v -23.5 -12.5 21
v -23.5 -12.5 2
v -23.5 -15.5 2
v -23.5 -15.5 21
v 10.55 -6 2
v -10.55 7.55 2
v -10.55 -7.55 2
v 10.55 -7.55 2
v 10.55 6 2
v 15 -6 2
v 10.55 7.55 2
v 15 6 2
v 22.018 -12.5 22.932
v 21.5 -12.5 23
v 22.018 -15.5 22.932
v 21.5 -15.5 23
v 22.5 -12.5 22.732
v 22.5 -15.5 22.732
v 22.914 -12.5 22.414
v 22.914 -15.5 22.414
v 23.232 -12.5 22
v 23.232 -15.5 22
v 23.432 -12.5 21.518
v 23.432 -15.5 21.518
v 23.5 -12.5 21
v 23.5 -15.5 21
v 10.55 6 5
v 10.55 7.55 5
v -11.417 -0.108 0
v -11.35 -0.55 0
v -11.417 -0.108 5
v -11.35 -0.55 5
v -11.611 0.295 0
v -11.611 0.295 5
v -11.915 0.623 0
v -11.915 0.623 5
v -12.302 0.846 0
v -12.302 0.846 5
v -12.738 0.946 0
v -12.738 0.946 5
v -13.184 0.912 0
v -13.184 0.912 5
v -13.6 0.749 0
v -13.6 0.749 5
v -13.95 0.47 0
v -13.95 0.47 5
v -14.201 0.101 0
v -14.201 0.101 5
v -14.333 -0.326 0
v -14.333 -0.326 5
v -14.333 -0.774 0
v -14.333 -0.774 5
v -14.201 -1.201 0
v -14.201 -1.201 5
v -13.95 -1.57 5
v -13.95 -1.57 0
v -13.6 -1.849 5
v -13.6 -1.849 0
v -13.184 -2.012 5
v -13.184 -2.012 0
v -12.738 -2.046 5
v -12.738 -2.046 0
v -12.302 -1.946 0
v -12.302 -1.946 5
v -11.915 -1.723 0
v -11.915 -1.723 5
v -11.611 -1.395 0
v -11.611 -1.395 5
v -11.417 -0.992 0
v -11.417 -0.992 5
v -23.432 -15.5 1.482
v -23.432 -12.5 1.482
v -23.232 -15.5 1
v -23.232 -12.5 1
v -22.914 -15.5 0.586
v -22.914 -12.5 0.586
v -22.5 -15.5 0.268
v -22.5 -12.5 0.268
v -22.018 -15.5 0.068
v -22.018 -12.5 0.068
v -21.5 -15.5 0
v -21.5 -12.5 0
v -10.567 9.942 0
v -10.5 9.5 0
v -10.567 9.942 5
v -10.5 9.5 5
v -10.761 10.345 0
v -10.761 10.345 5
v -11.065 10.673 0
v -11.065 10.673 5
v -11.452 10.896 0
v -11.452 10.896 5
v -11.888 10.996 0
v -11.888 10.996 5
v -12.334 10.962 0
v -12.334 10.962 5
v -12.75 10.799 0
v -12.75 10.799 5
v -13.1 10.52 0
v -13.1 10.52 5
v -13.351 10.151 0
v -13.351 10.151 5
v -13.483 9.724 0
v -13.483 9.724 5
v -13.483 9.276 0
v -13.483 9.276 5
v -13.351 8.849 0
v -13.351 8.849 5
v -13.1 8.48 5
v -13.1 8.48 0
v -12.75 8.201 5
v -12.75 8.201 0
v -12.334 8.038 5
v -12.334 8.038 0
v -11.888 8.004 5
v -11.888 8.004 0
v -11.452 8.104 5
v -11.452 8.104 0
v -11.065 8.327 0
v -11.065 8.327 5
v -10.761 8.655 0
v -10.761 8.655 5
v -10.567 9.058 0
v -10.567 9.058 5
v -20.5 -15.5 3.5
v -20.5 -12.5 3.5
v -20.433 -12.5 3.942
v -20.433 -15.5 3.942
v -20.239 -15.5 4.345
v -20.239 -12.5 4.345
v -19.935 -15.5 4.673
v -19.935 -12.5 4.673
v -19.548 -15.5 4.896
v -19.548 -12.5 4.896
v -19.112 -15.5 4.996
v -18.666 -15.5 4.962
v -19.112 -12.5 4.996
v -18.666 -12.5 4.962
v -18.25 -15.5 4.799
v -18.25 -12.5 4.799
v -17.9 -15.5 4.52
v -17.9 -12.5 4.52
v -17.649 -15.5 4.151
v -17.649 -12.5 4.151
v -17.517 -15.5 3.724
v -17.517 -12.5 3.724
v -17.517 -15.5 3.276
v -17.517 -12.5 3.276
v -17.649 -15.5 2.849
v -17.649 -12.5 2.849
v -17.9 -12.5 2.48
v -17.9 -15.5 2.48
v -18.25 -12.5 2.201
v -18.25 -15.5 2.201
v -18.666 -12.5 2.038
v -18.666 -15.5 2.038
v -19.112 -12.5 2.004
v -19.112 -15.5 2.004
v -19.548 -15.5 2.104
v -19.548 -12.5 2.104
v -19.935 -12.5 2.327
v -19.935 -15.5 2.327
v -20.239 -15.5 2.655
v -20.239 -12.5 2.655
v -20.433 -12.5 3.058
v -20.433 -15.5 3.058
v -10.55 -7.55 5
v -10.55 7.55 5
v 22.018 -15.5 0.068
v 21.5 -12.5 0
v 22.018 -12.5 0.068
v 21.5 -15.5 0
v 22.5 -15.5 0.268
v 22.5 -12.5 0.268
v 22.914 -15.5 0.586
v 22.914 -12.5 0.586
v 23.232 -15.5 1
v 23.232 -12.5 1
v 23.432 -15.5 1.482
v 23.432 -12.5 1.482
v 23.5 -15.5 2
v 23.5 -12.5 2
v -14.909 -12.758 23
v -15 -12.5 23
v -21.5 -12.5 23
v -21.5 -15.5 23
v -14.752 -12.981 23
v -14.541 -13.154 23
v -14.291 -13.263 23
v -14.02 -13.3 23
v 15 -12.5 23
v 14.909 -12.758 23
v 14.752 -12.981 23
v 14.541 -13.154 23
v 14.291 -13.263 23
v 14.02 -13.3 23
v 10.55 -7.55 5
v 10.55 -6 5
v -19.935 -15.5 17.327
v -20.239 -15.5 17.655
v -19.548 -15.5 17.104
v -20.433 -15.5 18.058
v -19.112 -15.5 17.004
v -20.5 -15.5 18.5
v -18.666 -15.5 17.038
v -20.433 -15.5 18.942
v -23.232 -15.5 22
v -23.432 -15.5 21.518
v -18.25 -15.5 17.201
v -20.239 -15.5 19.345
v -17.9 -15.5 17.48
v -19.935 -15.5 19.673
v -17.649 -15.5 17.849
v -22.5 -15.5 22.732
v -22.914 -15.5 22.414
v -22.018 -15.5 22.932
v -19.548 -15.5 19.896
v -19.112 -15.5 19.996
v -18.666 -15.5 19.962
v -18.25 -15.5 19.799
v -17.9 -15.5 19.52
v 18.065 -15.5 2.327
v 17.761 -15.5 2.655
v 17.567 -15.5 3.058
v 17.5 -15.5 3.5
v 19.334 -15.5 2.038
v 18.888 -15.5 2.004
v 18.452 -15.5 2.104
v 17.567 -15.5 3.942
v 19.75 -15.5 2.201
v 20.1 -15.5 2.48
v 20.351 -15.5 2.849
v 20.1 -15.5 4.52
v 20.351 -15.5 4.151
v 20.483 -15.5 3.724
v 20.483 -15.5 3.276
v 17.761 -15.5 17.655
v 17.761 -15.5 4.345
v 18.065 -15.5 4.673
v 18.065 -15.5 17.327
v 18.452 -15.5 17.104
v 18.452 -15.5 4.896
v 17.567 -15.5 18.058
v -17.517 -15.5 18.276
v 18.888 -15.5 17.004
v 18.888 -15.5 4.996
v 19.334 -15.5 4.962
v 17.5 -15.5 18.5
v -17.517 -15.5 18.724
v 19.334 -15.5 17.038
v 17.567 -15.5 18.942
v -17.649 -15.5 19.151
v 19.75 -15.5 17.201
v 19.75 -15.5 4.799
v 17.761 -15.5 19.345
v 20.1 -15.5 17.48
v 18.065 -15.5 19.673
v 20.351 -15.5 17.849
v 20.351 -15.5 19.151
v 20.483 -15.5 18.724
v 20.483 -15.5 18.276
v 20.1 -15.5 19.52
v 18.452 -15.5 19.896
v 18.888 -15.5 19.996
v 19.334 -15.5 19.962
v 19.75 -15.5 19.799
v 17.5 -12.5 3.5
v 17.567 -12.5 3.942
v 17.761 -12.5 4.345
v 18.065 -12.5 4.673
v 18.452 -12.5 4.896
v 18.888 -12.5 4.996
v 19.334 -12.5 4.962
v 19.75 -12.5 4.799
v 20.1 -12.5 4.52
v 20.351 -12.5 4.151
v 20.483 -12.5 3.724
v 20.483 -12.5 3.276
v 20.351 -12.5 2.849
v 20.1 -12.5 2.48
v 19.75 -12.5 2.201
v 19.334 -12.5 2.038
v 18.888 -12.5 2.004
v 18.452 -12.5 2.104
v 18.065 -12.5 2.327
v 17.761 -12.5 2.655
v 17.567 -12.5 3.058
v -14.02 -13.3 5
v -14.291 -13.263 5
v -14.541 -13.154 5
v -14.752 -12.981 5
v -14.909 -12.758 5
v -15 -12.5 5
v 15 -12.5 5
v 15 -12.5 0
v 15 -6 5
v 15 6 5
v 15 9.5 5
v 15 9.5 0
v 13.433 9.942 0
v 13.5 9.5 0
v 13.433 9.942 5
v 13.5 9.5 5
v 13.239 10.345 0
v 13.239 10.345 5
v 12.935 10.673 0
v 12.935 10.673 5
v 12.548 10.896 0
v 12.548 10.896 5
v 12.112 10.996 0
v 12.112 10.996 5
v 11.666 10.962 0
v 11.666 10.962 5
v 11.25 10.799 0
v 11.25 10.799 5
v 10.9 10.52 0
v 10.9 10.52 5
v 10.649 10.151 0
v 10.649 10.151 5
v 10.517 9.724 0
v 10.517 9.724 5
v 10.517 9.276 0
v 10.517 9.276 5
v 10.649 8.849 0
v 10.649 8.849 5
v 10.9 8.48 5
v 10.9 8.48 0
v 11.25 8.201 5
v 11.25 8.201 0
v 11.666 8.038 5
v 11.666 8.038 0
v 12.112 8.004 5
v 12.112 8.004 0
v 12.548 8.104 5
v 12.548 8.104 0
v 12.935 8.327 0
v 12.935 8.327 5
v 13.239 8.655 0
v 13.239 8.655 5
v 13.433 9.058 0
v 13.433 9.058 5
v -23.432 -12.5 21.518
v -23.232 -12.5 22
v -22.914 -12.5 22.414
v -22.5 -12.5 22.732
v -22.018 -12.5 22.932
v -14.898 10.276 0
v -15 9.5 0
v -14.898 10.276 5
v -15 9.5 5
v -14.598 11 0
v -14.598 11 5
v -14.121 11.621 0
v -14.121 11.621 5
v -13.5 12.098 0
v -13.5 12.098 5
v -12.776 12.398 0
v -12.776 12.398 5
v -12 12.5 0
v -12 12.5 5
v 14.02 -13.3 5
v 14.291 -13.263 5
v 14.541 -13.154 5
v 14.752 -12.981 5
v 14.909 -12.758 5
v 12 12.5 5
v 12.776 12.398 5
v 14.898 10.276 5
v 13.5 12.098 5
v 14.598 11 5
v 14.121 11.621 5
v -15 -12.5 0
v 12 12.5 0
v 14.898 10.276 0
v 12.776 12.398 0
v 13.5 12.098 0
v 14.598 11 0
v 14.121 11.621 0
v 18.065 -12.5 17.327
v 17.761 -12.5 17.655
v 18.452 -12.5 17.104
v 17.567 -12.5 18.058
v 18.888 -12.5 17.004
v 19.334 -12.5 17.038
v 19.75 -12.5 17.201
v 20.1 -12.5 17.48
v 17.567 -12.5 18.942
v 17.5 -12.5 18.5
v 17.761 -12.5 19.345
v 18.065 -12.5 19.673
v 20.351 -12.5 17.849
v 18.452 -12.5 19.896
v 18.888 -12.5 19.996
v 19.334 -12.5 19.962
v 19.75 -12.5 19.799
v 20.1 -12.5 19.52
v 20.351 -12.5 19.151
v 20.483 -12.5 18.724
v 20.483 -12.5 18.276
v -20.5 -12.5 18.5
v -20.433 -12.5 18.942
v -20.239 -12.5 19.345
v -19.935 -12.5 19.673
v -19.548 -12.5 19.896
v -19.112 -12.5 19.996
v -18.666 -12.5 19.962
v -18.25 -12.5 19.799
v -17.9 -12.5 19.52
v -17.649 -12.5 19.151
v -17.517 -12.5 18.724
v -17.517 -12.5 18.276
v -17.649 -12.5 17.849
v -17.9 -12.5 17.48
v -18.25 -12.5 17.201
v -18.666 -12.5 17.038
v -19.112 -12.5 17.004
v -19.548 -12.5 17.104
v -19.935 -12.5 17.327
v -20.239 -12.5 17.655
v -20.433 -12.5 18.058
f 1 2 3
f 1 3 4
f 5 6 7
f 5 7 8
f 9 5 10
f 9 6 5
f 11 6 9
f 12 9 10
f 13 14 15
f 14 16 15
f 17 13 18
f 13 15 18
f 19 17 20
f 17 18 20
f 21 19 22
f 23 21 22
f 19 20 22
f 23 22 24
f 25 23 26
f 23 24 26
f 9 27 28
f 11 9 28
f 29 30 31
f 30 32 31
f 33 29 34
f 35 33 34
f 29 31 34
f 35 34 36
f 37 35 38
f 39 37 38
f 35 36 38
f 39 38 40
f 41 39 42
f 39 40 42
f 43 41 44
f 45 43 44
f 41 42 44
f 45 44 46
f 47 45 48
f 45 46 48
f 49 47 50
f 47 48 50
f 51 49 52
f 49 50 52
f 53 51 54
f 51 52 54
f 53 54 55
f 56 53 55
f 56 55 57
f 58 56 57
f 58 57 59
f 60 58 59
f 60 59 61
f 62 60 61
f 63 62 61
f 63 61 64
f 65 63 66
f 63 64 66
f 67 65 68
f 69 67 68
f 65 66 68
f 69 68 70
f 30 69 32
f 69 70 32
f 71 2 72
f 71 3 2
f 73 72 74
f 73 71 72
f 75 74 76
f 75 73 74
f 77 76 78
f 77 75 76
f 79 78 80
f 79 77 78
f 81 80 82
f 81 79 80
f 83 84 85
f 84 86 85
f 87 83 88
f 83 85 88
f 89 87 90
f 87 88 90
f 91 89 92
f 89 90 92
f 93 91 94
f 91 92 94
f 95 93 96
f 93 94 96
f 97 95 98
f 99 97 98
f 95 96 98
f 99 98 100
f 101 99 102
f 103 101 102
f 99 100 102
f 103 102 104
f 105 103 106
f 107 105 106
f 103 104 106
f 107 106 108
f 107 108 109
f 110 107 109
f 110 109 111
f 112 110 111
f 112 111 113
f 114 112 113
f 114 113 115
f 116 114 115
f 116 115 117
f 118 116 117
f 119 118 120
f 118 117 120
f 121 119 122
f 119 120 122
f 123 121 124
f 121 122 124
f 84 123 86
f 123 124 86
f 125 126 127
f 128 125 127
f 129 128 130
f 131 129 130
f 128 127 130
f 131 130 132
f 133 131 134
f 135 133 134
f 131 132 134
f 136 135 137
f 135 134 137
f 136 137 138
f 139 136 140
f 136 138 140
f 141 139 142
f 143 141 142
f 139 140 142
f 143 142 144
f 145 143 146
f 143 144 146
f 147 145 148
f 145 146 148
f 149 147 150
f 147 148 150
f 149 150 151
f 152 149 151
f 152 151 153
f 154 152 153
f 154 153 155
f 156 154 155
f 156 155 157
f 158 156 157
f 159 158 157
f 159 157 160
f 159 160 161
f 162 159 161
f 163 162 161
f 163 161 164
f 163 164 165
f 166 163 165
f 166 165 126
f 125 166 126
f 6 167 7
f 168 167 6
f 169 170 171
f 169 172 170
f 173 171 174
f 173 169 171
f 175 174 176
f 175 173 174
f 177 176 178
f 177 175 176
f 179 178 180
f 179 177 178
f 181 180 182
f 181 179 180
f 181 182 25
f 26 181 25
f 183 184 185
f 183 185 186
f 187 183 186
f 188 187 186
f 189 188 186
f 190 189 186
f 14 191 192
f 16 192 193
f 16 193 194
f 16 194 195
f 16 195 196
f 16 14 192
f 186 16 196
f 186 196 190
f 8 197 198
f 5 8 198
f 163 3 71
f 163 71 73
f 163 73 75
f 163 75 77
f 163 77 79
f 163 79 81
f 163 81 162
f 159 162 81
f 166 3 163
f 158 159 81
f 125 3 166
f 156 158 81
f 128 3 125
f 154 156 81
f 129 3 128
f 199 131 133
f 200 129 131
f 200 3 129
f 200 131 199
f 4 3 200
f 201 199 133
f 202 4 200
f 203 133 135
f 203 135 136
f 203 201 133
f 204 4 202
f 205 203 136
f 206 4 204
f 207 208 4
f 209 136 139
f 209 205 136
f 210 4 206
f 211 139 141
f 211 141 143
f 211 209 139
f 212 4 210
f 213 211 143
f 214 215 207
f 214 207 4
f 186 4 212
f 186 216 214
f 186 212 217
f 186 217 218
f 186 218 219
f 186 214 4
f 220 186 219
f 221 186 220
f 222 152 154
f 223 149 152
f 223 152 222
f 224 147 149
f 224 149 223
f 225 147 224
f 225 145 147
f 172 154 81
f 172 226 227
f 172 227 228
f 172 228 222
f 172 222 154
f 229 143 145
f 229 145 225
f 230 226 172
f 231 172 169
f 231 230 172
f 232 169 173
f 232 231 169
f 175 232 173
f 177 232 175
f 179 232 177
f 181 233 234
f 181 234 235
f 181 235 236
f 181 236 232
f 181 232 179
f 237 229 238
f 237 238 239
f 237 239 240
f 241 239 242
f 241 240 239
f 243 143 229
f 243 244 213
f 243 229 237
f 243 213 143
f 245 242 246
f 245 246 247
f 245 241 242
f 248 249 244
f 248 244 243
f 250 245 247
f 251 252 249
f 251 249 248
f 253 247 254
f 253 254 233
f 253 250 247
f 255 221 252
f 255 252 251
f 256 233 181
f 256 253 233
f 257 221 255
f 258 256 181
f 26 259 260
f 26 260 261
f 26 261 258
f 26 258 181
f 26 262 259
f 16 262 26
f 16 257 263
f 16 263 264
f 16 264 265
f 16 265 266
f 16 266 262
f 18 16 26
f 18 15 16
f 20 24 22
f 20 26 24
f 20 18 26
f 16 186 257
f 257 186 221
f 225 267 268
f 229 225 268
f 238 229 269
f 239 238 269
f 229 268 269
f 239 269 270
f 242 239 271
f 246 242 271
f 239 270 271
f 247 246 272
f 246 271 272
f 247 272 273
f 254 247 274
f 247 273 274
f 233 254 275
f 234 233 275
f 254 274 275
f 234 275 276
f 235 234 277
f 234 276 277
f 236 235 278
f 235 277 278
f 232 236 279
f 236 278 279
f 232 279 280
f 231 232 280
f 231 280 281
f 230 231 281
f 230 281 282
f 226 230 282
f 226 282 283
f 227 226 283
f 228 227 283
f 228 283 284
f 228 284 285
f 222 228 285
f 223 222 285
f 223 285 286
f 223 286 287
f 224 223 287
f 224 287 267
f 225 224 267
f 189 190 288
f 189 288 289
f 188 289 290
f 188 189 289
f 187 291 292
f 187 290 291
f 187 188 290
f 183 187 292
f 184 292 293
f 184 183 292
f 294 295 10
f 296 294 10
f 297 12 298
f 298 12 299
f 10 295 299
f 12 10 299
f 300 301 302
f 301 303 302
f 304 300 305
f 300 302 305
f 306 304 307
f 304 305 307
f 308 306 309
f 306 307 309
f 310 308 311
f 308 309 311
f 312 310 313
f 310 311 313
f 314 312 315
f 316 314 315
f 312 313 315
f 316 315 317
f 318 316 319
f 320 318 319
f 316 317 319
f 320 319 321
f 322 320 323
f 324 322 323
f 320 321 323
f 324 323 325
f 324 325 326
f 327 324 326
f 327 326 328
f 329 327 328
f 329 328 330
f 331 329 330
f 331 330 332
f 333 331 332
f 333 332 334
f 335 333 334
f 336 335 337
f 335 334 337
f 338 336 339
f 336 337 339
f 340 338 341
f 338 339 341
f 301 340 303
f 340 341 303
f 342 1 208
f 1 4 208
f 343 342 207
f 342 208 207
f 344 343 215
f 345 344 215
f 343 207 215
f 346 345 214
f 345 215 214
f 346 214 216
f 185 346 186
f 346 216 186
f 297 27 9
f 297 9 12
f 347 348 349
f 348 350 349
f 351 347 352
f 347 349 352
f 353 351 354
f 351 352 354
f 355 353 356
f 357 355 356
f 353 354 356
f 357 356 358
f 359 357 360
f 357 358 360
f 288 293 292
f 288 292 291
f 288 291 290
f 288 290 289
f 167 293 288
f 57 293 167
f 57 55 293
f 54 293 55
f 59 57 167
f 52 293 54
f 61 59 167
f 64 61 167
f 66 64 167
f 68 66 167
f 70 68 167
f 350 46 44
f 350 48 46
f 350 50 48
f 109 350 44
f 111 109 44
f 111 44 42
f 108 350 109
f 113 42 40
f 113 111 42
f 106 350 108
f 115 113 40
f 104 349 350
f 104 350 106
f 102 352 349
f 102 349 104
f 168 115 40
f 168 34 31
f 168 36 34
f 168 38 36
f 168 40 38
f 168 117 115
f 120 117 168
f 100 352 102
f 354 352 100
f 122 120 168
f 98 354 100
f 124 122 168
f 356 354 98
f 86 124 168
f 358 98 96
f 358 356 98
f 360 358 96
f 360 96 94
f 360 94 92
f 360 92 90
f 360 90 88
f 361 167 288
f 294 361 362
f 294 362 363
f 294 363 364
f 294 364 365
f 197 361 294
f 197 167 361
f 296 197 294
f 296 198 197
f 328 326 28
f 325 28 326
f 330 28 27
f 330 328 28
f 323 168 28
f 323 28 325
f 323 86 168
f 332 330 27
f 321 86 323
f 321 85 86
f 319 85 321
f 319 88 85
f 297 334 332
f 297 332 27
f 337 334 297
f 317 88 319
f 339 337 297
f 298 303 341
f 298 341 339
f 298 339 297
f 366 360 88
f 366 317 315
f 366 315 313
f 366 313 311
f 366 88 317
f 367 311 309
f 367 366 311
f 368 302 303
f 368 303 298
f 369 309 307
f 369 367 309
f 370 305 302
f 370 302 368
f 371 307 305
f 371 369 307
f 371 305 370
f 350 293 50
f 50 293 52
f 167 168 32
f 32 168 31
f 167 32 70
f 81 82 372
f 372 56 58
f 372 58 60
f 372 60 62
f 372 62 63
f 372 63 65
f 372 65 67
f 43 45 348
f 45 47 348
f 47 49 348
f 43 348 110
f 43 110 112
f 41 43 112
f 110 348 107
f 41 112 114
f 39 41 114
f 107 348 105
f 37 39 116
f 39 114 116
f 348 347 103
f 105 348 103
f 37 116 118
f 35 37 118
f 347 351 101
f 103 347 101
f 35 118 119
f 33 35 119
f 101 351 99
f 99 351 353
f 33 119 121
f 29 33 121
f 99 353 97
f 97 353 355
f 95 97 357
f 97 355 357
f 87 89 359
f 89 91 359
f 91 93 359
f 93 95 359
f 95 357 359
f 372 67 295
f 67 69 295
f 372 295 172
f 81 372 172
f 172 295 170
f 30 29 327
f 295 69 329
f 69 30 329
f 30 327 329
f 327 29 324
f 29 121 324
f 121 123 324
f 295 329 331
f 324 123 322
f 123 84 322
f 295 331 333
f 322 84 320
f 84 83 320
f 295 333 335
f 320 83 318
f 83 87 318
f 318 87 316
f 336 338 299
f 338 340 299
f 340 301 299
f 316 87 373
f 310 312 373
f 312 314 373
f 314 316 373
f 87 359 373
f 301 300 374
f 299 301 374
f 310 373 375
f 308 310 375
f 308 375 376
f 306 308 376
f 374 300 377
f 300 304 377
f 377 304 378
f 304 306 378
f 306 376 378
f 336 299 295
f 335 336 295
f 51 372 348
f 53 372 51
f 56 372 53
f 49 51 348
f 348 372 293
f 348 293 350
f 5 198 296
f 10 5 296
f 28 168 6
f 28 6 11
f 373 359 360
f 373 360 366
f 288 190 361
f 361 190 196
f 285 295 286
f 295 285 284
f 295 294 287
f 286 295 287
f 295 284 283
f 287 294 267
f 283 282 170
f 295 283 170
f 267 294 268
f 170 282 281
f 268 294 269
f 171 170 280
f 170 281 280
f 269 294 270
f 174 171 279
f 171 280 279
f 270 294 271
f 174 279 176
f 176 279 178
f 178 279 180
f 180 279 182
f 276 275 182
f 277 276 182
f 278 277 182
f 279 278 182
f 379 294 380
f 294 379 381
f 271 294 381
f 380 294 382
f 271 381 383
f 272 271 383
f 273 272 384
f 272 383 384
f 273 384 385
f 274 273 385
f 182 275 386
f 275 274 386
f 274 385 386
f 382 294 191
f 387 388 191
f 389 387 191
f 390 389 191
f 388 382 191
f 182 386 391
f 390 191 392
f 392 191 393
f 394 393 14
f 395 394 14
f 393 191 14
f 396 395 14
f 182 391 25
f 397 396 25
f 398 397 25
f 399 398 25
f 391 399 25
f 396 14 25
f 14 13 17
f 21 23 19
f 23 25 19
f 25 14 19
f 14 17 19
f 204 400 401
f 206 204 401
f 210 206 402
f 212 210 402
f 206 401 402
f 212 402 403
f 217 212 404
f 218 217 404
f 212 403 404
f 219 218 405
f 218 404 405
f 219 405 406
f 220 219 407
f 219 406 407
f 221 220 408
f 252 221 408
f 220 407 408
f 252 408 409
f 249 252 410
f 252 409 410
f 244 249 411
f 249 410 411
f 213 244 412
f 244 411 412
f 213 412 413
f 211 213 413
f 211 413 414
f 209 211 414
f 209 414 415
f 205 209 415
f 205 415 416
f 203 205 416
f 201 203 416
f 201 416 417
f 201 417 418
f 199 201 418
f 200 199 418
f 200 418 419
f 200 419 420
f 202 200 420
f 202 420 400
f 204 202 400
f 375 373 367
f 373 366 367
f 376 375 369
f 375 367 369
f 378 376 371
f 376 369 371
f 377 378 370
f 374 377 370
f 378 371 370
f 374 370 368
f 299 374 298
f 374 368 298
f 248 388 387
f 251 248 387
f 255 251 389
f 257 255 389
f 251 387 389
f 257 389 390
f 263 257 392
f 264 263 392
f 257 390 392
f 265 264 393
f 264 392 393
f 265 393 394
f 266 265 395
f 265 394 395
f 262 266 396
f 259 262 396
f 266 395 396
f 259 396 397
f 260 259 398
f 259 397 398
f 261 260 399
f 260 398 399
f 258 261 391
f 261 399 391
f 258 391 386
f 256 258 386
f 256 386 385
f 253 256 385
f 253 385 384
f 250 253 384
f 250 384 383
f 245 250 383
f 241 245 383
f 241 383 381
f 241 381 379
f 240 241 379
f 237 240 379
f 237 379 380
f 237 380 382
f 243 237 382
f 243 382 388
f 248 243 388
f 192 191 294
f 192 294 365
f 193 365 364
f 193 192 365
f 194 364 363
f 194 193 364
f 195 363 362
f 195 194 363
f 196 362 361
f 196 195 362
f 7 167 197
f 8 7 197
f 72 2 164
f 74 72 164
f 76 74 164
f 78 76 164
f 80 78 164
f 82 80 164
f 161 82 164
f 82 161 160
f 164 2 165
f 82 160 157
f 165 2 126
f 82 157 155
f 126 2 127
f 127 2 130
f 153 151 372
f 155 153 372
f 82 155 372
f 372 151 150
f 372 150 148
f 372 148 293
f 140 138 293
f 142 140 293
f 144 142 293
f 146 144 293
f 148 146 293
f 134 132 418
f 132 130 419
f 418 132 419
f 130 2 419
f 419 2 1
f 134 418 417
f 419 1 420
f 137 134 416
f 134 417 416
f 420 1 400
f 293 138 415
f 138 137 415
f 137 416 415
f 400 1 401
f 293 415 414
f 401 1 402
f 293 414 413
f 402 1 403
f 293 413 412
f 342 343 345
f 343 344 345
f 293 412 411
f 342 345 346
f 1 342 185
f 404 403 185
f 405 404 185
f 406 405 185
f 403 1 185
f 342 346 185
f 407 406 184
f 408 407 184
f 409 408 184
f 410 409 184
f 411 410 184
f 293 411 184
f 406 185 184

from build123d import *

# Parameters (mm, degrees)
SKETCH_1_W          = 30
SKETCH_1_H          = 25
EXTRUDE_1_DEPTH     = 5
SKETCH_2_W          = 21.1
SKETCH_2_H          = 15.1
CUT_EXTRUDE_1_DEPTH = 3
SKETCH_3_W          = 4.45
SKETCH_3_H          = 12
CUT_EXTRUDE_2_DEPTH = 3
FILLET_3_R          = 3
SKETCH_8_R          = 1.5
CUT_EXTRUDE_6_DEPTH = 10
SKETCH_9_W          = 47
SKETCH_9_H          = 23
EXTRUDE_2_DEPTH     = 3
SKETCH_10_R         = 1.5
CUT_EXTRUDE_7_DEPTH = 42.306779105
FILLET_4_R          = 2
SKETCH_11_W         = 30
SKETCH_11_H         = 0.8
CUT_EXTRUDE_8_DEPTH = 18
FILLET_5_R          = 1


with BuildPart() as part:
    # 草图1 → 凸台-拉伸1 (new body)
    with BuildSketch(Plane.XY):
        Rectangle(SKETCH_1_W, SKETCH_1_H)
    extrude(amount=EXTRUDE_1_DEPTH)

    # 草图2 → 切除-拉伸1 (cut)
    with BuildSketch(Plane.XY.offset(5)):
        Rectangle(SKETCH_2_W, SKETCH_2_H)
    extrude(amount=-CUT_EXTRUDE_1_DEPTH, mode=Mode.SUBTRACT)

    # 草图3 → 切除-拉伸2 (cut)
    with BuildSketch(Plane.XY.offset(5)):
        with Locations((12.775, 0)):
            Rectangle(SKETCH_3_W, SKETCH_3_H)
    extrude(amount=-CUT_EXTRUDE_2_DEPTH, mode=Mode.SUBTRACT)

    # 圆角3
    fillet_3_edges = [part.edges().sort_by_distance(p)[0] for p in [
        (-15, 12.5, 2.5),
        (15, 12.5, 2.5),
    ]]
    fillet(fillet_3_edges, radius=FILLET_3_R)

    # 草图8 → 切除-拉伸6 (cut, symmetric)
    with BuildSketch(Plane.XY.offset(2)):
        with Locations((12, 9.5)):
            Circle(SKETCH_8_R)
        with Locations((-12, 9.5)):
            Circle(SKETCH_8_R)
        with Locations((-12.85, -0.55)):
            Circle(SKETCH_8_R)
    extrude(amount=CUT_EXTRUDE_6_DEPTH, both=True, mode=Mode.SUBTRACT)

    # 草图9 → 凸台-拉伸2 (add)
    with BuildSketch(Plane.XZ.offset(12.5)):
        with Locations((0, 11.5)):
            Rectangle(SKETCH_9_W, SKETCH_9_H)
    extrude(amount=EXTRUDE_2_DEPTH)

    # 草图10 → 切除-拉伸7 (cut, through all)
    with BuildSketch(Plane(origin=(0, -12.5, 0), x_dir=(1, 0, 0), z_dir=(0, 1, 0))):
        with Locations(Location((-19, -3.5, 0), (0, 0, 180))):
            Circle(SKETCH_10_R)
        with Locations(Location((19, -3.5, 0), (0, 0, 180))):
            Circle(SKETCH_10_R)
        with Locations(Location((-19, -18.5, 0), (0, 0, 180))):
            Circle(SKETCH_10_R)
        with Locations(Location((19, -18.5, 0), (0, 0, 180))):
            Circle(SKETCH_10_R)
    extrude(amount=-CUT_EXTRUDE_7_DEPTH, mode=Mode.SUBTRACT)

    # 圆角4
    fillet_4_edges = [part.edges().sort_by_distance(p)[0] for p in [
        (-23.5, -14, 23),
        (-23.5, -14, 0),
        (23.5, -14, 0),
        (23.5, -14, 23),
    ]]
    fillet(fillet_4_edges, radius=FILLET_4_R)

    # 草图11 → 切除-拉伸8 (cut)
    with BuildSketch(Plane.XY.offset(23)):
        with Locations((0, -12.9)):
            Rectangle(SKETCH_11_W, SKETCH_11_H)
    extrude(amount=-CUT_EXTRUDE_8_DEPTH, mode=Mode.SUBTRACT)

    # 圆角5
    # the kernel refuses this fillet: 1 mm, written as the material it adds along each edge
    with BuildSketch(Plane(origin=(15, -13.3, 23), x_dir=(-1.569855356819468e-12, 1.0, 0), z_dir=(0, 0, -1))) as fillet_5_piece_1:
        with BuildLine():
            CenterArc((1, -0.979795897), FILLET_5_R, 101.536959033, 78.463040967)
            Line((0, -0.979795897), (-0.02, -0.979795897))
            Line((-0.02, -0.979795897), (-0.02, 0))
            Line((-0.02, 0), (0, 0.02))
            ThreePointArc((0, 0.02), (0.4, 0.02), (0.796, 0.019595918))
            Line((0.796, 0.019595918), (0.8, 0))
        make_face()
    extrude(amount=20.449489743)
    with BuildSketch(Plane(origin=(-15, -13.3, 23), x_dir=(1.5720758028687176e-12, 1.0, 0), z_dir=(0, 0, -1))) as fillet_5_piece_2:
        with BuildLine():
            CenterArc((1, 0.979795897), FILLET_5_R, 180, 78.463040967)
            Line((0, 0.979795897), (-0.02, 0.979795897))
            Line((-0.02, 0.979795897), (-0.02, 0))
            Line((-0.02, 0), (0, -0.02))
            ThreePointArc((0, -0.02), (0.4, -0.02), (0.796, -0.019595918))
            Line((0.796, -0.019595918), (0.8, 0))
        make_face()
    extrude(amount=20.449489743)


solid = part.part
